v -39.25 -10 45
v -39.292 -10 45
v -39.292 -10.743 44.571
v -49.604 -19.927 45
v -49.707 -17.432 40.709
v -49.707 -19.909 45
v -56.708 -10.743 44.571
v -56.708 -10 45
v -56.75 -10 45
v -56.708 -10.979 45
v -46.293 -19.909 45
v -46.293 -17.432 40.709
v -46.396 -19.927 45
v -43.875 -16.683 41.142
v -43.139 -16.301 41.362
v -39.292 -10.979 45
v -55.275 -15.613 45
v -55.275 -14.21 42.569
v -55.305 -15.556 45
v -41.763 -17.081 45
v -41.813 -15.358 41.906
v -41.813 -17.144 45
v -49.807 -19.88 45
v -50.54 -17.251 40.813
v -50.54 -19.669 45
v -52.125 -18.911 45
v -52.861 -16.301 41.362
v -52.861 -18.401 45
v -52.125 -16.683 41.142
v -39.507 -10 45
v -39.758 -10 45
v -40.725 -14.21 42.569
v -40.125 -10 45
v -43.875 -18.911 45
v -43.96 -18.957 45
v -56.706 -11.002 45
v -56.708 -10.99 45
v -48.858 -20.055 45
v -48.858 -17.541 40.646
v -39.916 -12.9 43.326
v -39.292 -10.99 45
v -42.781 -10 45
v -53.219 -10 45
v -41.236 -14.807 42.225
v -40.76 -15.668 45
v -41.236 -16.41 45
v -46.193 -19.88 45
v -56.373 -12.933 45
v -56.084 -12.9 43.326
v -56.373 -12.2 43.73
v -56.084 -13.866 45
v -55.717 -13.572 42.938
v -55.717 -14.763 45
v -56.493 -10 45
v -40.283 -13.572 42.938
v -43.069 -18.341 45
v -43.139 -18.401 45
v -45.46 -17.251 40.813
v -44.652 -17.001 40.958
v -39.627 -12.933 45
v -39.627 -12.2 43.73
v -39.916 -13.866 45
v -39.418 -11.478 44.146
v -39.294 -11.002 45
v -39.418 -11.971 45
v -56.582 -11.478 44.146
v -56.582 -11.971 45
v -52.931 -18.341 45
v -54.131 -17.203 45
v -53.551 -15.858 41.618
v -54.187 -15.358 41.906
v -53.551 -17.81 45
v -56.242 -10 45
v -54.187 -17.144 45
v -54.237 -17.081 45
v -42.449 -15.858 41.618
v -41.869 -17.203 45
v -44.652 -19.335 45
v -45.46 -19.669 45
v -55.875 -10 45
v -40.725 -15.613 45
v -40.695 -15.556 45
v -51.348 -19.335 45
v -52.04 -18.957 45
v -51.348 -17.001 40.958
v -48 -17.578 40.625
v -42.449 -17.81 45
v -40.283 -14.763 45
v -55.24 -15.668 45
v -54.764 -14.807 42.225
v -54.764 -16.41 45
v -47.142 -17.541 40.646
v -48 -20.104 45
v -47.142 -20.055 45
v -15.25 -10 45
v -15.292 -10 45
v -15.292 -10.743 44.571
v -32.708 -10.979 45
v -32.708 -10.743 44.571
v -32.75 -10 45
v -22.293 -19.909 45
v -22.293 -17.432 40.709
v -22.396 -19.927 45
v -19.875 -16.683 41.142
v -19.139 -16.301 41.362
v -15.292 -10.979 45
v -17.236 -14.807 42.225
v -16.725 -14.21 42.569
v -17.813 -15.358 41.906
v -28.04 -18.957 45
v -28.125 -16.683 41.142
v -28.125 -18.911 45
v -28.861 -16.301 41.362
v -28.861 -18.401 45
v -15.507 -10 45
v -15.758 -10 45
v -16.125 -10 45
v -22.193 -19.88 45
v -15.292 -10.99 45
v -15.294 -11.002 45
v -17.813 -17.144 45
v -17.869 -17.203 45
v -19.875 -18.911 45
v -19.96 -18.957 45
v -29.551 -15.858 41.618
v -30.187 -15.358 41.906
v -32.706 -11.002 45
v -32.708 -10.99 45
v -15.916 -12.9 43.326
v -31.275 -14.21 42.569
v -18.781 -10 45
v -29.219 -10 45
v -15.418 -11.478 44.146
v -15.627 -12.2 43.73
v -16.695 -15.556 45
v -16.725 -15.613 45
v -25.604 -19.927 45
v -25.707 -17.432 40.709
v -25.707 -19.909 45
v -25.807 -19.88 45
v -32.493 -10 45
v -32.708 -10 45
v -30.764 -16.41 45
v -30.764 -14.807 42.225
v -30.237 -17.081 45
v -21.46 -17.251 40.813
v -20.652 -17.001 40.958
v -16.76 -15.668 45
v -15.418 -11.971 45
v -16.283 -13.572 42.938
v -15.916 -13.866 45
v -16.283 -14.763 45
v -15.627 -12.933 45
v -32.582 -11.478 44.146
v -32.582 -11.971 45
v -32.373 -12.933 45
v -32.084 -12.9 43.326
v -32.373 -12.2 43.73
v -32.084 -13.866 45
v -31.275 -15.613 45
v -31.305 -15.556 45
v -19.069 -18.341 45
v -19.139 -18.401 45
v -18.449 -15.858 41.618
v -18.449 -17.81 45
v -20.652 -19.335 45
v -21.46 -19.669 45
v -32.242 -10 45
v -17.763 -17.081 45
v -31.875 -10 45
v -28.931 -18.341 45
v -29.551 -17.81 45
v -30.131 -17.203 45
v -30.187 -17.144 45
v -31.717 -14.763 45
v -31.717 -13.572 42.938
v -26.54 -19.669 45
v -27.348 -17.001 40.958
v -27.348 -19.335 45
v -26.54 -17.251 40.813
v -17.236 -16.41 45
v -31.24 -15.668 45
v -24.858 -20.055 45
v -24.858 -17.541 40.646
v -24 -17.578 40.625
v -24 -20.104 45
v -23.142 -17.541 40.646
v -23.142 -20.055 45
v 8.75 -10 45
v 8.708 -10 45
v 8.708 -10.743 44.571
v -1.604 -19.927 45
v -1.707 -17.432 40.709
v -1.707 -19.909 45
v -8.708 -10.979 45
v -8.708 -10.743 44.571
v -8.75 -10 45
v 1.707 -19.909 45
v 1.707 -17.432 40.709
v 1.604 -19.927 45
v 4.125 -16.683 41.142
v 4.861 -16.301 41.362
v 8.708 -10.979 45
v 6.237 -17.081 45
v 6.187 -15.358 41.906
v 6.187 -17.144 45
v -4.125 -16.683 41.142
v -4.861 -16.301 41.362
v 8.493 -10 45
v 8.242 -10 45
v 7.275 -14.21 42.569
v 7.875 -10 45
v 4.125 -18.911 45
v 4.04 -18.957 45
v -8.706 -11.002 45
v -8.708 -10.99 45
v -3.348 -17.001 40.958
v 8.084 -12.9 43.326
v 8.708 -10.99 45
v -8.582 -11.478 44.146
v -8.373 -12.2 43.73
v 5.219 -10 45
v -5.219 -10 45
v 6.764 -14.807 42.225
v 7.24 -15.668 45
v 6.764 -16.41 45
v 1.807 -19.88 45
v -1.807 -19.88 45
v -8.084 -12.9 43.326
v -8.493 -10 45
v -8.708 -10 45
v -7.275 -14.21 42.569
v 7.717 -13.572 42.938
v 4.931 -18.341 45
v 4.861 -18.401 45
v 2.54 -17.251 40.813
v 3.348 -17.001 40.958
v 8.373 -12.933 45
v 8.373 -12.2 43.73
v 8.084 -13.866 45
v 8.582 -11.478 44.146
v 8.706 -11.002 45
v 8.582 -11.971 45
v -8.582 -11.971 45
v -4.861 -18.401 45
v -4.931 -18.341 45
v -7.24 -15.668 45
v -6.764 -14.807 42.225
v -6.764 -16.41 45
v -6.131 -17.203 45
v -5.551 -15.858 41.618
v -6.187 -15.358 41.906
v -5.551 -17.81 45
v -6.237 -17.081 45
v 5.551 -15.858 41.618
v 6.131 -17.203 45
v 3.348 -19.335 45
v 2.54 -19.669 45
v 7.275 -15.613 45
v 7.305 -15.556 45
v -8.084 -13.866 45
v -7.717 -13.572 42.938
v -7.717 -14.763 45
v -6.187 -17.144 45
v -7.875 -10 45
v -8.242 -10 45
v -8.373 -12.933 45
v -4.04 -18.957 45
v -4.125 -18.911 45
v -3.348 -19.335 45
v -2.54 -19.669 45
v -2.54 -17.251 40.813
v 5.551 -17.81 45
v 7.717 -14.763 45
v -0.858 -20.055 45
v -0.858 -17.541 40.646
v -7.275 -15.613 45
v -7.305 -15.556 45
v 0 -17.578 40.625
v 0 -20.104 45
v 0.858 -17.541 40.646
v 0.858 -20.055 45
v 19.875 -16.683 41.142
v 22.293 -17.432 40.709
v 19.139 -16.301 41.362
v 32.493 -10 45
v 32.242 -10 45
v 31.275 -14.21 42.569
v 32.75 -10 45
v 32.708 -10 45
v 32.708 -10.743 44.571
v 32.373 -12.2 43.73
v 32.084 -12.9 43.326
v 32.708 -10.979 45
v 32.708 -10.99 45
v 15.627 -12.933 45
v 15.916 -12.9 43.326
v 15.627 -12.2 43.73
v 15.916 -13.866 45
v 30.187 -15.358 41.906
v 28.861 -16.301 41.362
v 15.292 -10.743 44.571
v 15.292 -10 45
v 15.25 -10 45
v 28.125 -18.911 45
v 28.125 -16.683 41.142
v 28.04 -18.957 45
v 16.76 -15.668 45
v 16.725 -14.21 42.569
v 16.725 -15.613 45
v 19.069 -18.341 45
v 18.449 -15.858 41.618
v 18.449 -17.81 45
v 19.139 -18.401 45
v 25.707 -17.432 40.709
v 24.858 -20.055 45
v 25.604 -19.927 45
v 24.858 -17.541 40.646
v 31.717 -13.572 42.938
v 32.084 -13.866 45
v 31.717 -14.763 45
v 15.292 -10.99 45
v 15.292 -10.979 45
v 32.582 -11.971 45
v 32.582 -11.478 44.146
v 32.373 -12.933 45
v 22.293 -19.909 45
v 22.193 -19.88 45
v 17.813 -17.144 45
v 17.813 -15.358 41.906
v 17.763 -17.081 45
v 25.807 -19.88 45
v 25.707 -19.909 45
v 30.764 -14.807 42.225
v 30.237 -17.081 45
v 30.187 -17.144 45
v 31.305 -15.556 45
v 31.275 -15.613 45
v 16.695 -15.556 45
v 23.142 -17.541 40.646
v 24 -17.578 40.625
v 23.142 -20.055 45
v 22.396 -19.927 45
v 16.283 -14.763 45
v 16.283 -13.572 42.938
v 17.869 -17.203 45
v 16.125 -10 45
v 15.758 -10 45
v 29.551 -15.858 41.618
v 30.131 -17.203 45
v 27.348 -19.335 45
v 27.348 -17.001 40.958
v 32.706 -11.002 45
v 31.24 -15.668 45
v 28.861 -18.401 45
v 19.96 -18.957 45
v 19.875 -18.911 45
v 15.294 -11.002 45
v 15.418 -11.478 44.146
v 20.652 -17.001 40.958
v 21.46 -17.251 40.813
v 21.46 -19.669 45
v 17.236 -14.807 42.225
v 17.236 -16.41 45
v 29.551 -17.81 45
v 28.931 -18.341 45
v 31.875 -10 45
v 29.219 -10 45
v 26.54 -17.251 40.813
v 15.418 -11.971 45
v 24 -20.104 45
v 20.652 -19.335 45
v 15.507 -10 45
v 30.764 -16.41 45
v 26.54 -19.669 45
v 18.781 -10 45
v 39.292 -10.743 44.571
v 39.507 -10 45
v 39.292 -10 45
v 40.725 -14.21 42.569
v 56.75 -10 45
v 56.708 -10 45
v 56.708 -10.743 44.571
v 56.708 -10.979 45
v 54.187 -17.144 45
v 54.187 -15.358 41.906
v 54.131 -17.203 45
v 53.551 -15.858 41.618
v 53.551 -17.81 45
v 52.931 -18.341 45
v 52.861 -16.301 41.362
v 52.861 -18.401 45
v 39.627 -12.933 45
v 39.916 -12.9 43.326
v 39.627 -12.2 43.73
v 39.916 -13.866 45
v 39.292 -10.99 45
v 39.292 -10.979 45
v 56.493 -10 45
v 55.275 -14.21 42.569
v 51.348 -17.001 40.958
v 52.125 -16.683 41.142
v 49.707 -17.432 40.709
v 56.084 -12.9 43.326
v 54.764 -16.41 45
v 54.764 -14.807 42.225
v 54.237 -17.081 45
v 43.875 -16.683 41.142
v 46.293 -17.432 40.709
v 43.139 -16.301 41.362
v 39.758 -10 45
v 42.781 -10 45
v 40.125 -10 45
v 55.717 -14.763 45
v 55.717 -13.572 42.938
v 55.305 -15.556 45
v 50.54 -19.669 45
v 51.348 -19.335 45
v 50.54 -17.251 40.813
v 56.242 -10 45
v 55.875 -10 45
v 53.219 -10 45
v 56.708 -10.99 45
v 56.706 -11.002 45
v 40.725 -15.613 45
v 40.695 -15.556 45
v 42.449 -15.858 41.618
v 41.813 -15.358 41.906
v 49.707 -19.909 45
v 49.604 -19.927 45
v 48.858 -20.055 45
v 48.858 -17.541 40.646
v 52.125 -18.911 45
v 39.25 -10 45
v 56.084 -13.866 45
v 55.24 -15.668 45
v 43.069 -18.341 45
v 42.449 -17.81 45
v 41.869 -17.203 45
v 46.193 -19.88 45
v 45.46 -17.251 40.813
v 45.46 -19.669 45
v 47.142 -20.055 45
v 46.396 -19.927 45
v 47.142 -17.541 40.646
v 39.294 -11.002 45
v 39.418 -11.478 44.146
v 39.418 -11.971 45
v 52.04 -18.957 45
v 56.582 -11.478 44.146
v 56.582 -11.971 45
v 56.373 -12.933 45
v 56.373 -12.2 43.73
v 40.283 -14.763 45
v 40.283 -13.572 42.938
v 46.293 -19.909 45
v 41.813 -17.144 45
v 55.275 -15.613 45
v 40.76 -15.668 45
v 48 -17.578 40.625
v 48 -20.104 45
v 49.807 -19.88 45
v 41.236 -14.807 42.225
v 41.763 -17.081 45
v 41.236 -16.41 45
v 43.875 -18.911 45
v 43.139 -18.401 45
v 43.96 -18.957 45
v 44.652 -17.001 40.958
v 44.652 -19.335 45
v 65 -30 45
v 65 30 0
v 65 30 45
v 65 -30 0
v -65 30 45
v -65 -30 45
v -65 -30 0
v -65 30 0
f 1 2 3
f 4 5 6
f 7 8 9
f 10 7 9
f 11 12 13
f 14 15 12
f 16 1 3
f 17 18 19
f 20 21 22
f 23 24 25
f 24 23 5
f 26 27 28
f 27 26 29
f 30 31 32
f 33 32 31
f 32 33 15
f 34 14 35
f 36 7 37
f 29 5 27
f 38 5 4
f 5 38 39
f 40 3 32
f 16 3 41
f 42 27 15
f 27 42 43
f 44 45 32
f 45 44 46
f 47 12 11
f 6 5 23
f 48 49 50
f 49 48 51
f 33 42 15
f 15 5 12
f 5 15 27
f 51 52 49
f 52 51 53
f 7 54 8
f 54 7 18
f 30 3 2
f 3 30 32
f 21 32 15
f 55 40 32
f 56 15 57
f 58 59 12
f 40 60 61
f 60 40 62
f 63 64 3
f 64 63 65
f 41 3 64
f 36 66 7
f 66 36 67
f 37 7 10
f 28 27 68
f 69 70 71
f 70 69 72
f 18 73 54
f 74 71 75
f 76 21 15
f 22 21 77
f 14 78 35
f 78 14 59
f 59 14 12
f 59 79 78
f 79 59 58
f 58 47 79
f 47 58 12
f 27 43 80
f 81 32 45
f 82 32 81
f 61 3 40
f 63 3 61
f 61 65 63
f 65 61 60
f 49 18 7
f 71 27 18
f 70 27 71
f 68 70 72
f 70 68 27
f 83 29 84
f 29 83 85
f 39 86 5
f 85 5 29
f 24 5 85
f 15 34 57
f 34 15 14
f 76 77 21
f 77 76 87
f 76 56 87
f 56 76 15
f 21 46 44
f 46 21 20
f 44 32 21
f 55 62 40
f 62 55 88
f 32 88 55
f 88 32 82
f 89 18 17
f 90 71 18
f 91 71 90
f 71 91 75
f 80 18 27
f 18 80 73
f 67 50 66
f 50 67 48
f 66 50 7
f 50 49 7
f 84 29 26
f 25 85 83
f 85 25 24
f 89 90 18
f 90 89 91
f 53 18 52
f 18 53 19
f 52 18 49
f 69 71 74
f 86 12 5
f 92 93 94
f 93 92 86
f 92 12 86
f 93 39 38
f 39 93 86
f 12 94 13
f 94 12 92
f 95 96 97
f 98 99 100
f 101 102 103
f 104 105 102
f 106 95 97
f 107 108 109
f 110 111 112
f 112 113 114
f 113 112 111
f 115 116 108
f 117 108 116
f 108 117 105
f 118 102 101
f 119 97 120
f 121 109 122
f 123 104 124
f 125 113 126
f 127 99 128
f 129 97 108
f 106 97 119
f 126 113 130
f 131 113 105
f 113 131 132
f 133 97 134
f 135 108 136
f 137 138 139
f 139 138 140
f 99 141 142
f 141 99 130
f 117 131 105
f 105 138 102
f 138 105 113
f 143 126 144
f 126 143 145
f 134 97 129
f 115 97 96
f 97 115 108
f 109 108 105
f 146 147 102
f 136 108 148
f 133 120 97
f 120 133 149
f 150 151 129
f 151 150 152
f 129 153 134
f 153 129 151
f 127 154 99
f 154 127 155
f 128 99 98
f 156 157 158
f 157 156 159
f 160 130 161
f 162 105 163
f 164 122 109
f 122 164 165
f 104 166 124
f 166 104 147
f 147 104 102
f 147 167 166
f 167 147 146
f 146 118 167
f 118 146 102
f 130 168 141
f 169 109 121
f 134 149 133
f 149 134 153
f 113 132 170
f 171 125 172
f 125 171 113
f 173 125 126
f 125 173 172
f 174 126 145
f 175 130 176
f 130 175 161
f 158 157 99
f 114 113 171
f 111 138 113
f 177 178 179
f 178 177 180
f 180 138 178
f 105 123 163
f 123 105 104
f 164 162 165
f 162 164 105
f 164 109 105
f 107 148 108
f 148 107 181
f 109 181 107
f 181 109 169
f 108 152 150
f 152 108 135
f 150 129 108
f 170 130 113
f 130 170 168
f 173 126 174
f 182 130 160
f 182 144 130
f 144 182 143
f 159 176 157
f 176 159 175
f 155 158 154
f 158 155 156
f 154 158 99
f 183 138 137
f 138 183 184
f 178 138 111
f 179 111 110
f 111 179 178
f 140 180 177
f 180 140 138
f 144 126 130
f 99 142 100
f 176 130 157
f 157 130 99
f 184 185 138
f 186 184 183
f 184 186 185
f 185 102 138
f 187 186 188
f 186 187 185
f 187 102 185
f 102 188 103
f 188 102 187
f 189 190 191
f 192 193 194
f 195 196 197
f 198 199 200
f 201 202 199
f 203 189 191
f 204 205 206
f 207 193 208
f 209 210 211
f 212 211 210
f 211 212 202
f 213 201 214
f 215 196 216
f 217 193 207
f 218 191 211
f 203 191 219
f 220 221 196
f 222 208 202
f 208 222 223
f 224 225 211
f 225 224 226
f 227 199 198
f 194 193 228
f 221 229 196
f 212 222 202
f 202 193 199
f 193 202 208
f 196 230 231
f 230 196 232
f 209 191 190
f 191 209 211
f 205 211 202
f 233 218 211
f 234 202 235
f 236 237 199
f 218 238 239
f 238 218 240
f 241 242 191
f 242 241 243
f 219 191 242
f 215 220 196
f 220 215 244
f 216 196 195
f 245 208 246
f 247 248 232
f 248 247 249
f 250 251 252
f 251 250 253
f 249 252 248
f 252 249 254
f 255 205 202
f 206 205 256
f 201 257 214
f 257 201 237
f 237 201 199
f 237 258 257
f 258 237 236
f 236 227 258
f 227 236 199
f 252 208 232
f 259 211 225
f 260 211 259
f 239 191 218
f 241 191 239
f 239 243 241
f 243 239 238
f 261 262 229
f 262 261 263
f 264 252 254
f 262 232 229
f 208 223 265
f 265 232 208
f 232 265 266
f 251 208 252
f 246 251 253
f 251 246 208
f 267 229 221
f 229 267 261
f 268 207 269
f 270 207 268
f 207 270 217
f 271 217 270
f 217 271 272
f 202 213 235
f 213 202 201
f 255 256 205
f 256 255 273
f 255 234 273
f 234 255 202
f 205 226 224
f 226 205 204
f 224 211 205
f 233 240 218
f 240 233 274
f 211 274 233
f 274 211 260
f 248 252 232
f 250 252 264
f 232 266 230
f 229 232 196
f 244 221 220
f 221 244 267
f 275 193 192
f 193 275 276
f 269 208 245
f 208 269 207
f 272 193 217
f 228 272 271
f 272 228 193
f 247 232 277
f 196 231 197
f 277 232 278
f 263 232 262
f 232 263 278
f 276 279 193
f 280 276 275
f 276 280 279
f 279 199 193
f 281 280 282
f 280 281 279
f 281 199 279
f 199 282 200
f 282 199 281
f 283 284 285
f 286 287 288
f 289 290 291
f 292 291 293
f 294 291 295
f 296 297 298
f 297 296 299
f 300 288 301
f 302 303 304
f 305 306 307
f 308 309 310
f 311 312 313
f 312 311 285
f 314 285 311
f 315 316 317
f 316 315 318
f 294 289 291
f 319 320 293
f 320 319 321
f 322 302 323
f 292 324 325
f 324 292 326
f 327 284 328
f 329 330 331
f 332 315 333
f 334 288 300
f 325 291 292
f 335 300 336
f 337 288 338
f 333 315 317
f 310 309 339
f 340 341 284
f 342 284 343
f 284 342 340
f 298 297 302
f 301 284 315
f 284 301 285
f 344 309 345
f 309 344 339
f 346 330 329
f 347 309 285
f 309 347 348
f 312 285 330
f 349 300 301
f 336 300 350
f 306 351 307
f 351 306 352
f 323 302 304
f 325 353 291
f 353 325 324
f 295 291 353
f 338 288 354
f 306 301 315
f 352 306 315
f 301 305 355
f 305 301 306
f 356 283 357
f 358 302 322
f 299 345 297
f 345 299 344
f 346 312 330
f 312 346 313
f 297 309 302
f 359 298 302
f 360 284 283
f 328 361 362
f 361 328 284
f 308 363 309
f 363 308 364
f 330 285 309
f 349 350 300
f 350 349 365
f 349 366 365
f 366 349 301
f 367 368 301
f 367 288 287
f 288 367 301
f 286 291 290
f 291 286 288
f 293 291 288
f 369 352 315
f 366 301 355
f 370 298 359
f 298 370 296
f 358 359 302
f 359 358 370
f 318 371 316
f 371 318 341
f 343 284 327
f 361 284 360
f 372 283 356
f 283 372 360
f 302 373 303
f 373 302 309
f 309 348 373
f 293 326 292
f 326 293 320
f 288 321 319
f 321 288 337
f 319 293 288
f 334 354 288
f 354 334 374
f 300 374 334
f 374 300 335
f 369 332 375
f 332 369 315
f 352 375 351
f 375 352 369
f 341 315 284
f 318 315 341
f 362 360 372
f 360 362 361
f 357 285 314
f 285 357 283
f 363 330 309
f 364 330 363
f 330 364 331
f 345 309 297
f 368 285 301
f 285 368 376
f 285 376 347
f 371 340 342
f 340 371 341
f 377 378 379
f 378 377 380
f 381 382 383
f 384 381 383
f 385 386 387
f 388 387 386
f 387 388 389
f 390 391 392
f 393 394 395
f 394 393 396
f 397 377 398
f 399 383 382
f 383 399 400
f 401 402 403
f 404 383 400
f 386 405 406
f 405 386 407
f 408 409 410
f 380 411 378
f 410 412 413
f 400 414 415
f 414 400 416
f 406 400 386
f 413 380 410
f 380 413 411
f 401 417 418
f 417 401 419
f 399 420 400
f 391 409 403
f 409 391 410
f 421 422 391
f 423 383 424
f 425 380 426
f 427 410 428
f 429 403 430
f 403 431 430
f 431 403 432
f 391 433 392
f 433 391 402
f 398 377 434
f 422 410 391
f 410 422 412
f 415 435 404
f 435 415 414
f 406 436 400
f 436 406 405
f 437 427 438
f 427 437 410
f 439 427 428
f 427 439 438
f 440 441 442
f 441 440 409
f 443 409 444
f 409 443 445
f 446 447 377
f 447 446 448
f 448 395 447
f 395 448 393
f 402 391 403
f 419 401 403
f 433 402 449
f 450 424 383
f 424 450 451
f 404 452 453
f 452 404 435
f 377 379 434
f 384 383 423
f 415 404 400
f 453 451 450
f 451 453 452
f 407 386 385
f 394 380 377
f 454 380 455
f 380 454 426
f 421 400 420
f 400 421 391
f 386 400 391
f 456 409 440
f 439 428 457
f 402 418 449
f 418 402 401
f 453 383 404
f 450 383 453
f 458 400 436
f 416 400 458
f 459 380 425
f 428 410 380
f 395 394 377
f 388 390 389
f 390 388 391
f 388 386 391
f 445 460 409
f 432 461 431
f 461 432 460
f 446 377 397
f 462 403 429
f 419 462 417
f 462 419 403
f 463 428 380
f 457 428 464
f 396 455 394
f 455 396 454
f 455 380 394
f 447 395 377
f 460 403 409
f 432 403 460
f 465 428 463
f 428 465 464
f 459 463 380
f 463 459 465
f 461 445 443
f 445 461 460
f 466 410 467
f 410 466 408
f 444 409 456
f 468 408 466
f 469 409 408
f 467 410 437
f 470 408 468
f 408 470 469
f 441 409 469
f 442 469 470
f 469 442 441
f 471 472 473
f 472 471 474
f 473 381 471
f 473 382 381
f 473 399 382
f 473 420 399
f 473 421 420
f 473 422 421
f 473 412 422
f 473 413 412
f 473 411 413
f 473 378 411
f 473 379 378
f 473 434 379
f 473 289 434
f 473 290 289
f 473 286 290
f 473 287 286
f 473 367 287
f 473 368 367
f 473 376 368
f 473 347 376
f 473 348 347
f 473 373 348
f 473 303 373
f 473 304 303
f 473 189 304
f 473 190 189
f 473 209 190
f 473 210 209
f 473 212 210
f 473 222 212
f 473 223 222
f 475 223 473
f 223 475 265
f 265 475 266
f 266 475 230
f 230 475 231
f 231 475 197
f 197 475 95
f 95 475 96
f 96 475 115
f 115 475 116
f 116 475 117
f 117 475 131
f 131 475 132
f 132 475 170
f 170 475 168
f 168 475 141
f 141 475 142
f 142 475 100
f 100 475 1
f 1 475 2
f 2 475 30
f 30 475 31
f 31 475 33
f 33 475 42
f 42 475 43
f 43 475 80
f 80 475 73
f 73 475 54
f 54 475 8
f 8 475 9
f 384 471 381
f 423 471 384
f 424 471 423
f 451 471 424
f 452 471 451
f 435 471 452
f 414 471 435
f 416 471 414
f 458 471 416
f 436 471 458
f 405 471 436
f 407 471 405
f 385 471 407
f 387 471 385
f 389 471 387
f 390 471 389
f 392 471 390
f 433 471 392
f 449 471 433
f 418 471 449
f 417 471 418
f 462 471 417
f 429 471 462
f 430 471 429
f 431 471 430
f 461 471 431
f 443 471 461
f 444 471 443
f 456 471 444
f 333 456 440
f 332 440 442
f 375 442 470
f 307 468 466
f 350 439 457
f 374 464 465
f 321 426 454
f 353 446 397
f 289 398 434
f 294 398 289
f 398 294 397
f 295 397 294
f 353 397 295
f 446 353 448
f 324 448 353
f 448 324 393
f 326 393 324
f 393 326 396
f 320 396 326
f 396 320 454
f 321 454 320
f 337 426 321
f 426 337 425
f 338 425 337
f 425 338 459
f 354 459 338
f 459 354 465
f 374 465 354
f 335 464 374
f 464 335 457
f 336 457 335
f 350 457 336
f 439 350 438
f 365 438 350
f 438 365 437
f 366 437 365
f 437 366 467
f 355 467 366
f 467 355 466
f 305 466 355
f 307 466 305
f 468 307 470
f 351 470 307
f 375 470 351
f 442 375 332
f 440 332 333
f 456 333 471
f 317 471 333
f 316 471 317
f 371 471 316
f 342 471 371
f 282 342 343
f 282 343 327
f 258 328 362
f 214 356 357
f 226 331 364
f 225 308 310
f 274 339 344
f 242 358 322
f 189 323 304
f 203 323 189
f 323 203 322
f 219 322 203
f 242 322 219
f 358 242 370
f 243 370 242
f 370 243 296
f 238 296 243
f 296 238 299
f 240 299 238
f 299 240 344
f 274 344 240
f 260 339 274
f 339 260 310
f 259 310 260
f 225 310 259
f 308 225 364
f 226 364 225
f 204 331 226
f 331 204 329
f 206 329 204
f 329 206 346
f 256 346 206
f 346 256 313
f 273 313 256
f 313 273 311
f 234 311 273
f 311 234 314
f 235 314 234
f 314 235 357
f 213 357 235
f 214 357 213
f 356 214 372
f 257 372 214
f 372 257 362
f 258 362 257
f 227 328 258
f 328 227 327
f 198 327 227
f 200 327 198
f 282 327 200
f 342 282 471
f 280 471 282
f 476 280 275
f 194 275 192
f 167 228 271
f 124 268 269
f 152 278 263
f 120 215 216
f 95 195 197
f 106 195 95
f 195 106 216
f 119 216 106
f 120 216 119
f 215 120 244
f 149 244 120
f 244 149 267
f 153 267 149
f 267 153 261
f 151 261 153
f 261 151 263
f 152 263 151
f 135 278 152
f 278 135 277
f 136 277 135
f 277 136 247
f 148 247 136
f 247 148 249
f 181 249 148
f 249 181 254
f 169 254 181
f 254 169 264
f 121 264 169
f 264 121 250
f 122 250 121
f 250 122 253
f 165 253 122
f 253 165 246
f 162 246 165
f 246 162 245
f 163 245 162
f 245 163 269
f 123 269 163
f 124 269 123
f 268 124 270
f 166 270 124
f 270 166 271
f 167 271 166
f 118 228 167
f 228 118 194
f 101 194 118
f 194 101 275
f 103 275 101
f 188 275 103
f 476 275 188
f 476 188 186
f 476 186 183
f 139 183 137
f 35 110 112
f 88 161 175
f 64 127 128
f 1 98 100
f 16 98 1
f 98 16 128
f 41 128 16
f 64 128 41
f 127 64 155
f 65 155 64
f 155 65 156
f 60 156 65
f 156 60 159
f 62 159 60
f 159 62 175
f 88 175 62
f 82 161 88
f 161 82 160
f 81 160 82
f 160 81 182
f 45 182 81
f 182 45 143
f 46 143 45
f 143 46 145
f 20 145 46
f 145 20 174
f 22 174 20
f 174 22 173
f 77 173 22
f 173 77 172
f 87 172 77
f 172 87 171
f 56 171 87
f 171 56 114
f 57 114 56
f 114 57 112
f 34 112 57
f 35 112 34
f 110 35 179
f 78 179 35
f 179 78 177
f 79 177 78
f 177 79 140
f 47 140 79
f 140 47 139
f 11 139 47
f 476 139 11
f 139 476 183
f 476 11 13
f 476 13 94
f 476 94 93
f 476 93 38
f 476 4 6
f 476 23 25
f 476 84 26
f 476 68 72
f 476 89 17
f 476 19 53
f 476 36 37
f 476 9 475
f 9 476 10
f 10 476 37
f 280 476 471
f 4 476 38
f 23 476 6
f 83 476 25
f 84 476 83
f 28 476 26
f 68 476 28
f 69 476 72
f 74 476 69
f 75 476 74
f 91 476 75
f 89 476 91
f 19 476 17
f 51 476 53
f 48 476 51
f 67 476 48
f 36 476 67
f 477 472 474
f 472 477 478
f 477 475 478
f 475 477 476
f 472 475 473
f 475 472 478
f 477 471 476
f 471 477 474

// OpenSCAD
// 15mL Conical Tube Rack - Corrected
// Designed for easy volume reading and supernatant removal.

// --- Dimensions ---
L = 130;            // Length along X (mm)
W = 60;             // Depth along Y (mm)
H = 45;            // Height along Z (mm)

num_holes = 5;      // Number of tube holes
spacing = 24;       // Spacing between hole centers along X (mm)

hole_d = 17.5;      // Diameter of the holes (mm)
hole_depth = 40;    // Depth of the holes (mm)
tilt_angle = 30;    // Tilt angle from vertical (degrees)
y_top_offset = -10; // Y position where hole axis meets top face

// --- Parameters ---
$fn = 64;

// Calculate the starting X position to center the holes
hole_x_start = -(num_holes - 1) / 2 * spacing;

// --- Modeling ---

difference() {
    // The main block
    // Centered on X and Y, sitting on Z=0
    translate([-L/2, -W/2, 0])
        cube([L, W, H]);

    // The five blind holes
    for (i = [0 : num_holes - 1]) {
        let (
            current_x = hole_x_start + (i * spacing),
            current_y = y_top_offset
        )
        // To tilt the hole:
        // 1. Move to the intersection point on the top face
        // 2. Rotate around X axis by 30 degrees
        // 3. The cylinder is created extending downwards.
        // To ensure the top is flat and flush with the block, 
        // we rotate the cylinder and then translate it so its top is at Z=H.
        
        translate([current_x, current_y, H])
        rotate([tilt_angle, 0, 0])
        // We use a small offset in Z to ensure a clean cut through the top face
        // and we translate the cylinder down so its top is at the rotation point.
        // Since rotate([30,0,0]) tilts the Z axis towards +Y, 
        // and we want it to go DOWN into the block, we must ensure 
        // the cylinder is oriented correctly.
        // A cylinder(h=depth) starts at 0 and goes to h.
        // If we rotate [30,0,0], the Z axis vector [0,0,-1] becomes [0, sin(30), -cos(30)].
        // This moves the axis toward +Y as Z decreases.
        translate([0, 0, 0])
        cylinder(h = hole_depth + 1, d = hole_d);
    }
}

// Note on the tilt logic:
// The user wants the axis to move toward +Y as it goes down.
// A rotation of 30 degrees around X:
// The vector [0, 0, -1] (down) becomes [0, sin(30), -cos(30)].
// This results in a Y component of +0.5, which is +Y.
// This matches the requirement "going down into the block, it moves toward +Y".
